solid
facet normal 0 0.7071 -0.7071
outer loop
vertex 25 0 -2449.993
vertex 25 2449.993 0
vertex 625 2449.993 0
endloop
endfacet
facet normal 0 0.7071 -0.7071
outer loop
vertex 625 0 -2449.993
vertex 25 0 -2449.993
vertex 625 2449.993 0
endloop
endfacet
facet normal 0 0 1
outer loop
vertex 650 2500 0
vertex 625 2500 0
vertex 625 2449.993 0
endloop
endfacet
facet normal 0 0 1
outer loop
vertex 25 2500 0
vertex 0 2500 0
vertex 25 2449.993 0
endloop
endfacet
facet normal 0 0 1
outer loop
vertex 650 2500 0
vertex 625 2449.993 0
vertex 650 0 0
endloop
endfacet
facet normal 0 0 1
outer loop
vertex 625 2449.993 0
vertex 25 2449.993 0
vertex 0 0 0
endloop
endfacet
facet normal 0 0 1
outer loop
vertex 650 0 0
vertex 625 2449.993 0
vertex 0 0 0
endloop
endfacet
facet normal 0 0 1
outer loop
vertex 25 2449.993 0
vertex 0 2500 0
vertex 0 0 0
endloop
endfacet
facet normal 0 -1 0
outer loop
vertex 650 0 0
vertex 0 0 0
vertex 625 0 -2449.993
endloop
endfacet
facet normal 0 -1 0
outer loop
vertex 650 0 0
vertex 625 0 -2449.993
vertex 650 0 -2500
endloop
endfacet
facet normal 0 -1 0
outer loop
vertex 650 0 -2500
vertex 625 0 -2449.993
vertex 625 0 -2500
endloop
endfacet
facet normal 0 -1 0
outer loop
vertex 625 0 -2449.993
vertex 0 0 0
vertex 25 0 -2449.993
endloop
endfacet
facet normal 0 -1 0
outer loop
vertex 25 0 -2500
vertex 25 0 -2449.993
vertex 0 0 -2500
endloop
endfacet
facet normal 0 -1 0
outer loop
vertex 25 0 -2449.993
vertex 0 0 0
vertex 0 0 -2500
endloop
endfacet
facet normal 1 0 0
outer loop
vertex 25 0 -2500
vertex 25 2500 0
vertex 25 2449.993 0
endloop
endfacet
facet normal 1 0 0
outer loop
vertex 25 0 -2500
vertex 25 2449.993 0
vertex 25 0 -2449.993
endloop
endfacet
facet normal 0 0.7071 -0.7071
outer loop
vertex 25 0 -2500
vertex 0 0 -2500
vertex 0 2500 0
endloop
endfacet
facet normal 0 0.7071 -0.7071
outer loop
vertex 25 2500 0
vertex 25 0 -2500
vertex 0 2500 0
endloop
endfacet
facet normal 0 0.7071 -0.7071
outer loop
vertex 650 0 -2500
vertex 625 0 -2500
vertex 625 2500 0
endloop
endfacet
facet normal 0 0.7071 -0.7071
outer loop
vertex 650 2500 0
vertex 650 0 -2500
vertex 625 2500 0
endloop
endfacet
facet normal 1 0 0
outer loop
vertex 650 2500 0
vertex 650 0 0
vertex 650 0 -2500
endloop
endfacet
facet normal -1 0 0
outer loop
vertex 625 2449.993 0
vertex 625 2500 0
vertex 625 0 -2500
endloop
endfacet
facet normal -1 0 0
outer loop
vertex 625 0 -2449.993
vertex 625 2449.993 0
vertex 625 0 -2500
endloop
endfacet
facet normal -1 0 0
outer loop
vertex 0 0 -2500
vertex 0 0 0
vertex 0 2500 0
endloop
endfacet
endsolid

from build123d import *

# Parameters (mm, degrees)
BOSS_EXTRUDE1_DEPTH = 650
SKETCH5_W           = 600
SKETCH5_H           = 3535.533905932
CUT_EXTRUDE1_DEPTH  = 35.36


with BuildPart() as part:
    # Sketch3 → Boss-Extrude1 (new body)
    with BuildSketch(Plane(origin=(0, 0, 0), x_dir=(0, 0, -1), z_dir=(1, 0, 0))):
        Polygon((0, 0), (2500, 0), (0, 2500), align=None)
    extrude(amount=BOSS_EXTRUDE1_DEPTH)

    # Sketch5 → Cut-Extrude1 (cut)
    with BuildSketch(Plane(origin=(0, 1250, -1250), x_dir=(1, 0, 0), z_dir=(0, 0.707106781, -0.707106781))):
        with Locations((325, 0)):
            Rectangle(SKETCH5_W, SKETCH5_H)
    extrude(amount=-CUT_EXTRUDE1_DEPTH, mode=Mode.SUBTRACT)


solid = part.part
